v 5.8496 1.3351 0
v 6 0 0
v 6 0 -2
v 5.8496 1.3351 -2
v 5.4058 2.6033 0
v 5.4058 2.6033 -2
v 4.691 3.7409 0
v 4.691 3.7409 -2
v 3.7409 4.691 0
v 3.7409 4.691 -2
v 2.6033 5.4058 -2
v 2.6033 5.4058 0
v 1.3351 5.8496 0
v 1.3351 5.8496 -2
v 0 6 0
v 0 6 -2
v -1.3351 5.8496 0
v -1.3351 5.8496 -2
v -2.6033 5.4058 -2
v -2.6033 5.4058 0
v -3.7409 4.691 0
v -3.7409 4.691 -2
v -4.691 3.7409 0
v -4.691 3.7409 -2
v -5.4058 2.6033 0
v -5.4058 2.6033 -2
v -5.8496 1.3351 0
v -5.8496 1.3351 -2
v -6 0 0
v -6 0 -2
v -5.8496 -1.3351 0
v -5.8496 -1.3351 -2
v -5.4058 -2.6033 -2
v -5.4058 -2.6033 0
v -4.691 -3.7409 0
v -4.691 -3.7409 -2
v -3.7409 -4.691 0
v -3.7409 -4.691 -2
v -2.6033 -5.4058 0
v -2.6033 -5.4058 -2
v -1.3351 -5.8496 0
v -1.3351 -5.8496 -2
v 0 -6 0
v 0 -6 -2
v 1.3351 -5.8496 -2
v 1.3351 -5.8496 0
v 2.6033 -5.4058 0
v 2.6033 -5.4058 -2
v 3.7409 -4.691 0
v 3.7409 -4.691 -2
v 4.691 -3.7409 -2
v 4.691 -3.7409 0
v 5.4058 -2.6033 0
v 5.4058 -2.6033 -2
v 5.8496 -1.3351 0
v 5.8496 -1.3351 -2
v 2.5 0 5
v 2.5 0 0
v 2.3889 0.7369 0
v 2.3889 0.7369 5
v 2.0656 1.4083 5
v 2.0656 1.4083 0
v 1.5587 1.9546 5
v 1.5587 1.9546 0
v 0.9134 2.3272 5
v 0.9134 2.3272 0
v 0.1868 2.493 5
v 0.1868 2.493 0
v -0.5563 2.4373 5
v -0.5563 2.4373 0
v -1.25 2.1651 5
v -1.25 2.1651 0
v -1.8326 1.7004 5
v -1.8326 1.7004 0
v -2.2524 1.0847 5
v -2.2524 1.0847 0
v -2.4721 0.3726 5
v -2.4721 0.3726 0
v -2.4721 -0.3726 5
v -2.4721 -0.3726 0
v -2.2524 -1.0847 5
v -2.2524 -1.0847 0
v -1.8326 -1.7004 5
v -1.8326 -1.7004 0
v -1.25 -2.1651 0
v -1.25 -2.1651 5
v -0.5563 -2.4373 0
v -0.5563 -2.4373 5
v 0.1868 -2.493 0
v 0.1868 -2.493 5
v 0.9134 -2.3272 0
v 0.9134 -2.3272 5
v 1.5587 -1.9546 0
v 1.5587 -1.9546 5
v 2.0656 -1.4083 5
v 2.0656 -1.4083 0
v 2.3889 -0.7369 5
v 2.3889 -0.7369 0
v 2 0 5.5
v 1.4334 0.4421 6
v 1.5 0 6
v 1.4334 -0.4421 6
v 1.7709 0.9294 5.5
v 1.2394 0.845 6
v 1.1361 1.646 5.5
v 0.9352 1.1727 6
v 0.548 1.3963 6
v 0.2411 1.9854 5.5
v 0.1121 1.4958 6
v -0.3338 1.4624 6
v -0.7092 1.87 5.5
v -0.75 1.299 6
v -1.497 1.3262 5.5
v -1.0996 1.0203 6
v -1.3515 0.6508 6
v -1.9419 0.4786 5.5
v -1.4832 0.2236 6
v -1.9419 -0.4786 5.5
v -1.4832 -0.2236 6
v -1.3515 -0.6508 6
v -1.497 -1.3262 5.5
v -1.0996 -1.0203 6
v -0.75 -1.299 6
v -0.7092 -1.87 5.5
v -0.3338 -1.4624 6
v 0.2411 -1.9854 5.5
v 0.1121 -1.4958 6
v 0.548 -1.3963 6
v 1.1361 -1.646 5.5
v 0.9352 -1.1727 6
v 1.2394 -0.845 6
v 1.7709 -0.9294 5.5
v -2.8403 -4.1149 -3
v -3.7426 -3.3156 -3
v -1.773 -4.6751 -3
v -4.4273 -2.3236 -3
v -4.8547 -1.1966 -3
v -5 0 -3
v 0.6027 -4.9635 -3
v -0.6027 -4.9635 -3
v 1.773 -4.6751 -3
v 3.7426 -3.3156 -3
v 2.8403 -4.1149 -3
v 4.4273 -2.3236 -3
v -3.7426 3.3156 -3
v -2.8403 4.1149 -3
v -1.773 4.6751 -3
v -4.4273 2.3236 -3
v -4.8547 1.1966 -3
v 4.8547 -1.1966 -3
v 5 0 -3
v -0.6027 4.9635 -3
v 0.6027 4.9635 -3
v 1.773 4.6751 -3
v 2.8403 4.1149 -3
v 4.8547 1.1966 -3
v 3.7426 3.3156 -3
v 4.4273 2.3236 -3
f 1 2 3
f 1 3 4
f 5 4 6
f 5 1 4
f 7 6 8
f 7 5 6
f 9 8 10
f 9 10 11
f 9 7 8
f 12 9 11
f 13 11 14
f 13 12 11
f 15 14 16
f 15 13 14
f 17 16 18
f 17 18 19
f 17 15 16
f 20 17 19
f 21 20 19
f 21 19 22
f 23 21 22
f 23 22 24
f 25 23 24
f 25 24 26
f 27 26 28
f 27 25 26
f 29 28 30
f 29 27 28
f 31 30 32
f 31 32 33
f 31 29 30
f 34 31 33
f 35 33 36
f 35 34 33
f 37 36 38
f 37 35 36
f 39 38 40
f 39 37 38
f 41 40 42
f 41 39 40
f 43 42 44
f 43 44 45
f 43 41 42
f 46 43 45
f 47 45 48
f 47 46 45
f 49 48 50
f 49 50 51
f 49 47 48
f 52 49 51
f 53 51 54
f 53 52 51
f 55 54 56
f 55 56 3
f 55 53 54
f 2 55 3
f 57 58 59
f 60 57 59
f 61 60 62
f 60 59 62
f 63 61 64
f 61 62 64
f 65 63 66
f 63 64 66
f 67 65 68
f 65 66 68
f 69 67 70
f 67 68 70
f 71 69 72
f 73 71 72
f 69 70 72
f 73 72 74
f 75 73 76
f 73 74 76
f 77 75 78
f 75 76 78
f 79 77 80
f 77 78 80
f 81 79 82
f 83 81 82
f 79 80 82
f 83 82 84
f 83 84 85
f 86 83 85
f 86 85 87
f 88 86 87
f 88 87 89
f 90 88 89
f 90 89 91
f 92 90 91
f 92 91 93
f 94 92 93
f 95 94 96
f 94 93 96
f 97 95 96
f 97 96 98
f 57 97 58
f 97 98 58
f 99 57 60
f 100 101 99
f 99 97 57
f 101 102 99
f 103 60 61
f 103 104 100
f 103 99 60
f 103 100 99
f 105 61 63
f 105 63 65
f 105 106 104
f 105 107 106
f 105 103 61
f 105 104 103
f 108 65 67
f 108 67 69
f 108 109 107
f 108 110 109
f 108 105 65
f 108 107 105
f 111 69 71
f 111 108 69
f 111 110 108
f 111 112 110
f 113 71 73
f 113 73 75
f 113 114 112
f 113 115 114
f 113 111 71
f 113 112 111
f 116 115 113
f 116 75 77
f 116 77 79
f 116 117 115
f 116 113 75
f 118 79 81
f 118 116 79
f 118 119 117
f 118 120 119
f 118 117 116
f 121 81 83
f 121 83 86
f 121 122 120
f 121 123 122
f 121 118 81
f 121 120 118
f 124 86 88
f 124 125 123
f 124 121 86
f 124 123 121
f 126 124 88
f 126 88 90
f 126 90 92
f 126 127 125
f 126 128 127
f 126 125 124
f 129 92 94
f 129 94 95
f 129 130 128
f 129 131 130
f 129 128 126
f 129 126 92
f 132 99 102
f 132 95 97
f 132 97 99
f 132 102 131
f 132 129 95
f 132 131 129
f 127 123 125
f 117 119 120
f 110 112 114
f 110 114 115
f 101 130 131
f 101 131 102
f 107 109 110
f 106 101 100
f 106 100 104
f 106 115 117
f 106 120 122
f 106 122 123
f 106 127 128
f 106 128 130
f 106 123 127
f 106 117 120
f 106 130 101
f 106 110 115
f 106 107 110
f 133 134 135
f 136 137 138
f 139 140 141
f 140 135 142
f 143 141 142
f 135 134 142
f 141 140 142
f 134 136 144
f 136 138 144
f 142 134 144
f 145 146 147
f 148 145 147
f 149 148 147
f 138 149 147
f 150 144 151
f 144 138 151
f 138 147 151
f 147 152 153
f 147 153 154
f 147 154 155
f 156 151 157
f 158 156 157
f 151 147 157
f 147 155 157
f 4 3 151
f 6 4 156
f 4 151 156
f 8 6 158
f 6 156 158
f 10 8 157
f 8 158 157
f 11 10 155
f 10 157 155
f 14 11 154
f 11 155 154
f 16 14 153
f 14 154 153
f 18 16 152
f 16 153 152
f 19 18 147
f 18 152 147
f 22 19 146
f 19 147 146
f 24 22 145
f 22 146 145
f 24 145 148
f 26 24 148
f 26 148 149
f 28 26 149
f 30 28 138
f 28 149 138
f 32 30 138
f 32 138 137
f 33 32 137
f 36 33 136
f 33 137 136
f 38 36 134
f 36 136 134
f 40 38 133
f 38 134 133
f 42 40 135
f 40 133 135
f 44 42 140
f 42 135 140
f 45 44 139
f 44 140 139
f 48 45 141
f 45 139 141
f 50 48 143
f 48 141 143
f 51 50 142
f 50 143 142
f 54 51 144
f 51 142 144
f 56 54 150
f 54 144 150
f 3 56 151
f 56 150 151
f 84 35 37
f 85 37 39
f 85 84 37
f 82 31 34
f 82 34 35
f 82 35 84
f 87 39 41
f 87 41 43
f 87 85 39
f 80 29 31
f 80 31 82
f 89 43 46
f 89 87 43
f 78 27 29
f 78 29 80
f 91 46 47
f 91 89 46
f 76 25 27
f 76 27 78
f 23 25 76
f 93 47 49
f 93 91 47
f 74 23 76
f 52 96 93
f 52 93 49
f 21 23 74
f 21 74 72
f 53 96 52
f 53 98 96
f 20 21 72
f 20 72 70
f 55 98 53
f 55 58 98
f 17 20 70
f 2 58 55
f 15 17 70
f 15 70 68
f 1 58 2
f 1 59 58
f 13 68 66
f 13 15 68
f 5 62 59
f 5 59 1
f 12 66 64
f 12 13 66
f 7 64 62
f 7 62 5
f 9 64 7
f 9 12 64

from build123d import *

# Parameters (mm, degrees)
F0_R     = 6
F0_R_2   = 2.5
F1_DEPTH = 3
F2_DEPTH = 6
F3_SIZE  = 1


with BuildPart() as f1:
    # F0 (on Top) → F1 (new body)
    with BuildSketch(Plane.XY):
        Circle(F0_R)
        Circle(F0_R_2, mode=Mode.SUBTRACT)
        Circle(F0_R_2)
    extrude(amount=-F1_DEPTH)

    # F0 (on Top) → F2 (join)
    with BuildSketch(Plane.XY):
        Circle(F0_R_2)
    extrude(amount=F2_DEPTH)

    # F3
    f3_edges = [f1.edges().sort_by_distance(p)[0] for p in [
        (-2.5, 0, 6),
        (-6, 0, -3),
    ]]
    chamfer(f3_edges, length=F3_SIZE)


solid = f1.part
